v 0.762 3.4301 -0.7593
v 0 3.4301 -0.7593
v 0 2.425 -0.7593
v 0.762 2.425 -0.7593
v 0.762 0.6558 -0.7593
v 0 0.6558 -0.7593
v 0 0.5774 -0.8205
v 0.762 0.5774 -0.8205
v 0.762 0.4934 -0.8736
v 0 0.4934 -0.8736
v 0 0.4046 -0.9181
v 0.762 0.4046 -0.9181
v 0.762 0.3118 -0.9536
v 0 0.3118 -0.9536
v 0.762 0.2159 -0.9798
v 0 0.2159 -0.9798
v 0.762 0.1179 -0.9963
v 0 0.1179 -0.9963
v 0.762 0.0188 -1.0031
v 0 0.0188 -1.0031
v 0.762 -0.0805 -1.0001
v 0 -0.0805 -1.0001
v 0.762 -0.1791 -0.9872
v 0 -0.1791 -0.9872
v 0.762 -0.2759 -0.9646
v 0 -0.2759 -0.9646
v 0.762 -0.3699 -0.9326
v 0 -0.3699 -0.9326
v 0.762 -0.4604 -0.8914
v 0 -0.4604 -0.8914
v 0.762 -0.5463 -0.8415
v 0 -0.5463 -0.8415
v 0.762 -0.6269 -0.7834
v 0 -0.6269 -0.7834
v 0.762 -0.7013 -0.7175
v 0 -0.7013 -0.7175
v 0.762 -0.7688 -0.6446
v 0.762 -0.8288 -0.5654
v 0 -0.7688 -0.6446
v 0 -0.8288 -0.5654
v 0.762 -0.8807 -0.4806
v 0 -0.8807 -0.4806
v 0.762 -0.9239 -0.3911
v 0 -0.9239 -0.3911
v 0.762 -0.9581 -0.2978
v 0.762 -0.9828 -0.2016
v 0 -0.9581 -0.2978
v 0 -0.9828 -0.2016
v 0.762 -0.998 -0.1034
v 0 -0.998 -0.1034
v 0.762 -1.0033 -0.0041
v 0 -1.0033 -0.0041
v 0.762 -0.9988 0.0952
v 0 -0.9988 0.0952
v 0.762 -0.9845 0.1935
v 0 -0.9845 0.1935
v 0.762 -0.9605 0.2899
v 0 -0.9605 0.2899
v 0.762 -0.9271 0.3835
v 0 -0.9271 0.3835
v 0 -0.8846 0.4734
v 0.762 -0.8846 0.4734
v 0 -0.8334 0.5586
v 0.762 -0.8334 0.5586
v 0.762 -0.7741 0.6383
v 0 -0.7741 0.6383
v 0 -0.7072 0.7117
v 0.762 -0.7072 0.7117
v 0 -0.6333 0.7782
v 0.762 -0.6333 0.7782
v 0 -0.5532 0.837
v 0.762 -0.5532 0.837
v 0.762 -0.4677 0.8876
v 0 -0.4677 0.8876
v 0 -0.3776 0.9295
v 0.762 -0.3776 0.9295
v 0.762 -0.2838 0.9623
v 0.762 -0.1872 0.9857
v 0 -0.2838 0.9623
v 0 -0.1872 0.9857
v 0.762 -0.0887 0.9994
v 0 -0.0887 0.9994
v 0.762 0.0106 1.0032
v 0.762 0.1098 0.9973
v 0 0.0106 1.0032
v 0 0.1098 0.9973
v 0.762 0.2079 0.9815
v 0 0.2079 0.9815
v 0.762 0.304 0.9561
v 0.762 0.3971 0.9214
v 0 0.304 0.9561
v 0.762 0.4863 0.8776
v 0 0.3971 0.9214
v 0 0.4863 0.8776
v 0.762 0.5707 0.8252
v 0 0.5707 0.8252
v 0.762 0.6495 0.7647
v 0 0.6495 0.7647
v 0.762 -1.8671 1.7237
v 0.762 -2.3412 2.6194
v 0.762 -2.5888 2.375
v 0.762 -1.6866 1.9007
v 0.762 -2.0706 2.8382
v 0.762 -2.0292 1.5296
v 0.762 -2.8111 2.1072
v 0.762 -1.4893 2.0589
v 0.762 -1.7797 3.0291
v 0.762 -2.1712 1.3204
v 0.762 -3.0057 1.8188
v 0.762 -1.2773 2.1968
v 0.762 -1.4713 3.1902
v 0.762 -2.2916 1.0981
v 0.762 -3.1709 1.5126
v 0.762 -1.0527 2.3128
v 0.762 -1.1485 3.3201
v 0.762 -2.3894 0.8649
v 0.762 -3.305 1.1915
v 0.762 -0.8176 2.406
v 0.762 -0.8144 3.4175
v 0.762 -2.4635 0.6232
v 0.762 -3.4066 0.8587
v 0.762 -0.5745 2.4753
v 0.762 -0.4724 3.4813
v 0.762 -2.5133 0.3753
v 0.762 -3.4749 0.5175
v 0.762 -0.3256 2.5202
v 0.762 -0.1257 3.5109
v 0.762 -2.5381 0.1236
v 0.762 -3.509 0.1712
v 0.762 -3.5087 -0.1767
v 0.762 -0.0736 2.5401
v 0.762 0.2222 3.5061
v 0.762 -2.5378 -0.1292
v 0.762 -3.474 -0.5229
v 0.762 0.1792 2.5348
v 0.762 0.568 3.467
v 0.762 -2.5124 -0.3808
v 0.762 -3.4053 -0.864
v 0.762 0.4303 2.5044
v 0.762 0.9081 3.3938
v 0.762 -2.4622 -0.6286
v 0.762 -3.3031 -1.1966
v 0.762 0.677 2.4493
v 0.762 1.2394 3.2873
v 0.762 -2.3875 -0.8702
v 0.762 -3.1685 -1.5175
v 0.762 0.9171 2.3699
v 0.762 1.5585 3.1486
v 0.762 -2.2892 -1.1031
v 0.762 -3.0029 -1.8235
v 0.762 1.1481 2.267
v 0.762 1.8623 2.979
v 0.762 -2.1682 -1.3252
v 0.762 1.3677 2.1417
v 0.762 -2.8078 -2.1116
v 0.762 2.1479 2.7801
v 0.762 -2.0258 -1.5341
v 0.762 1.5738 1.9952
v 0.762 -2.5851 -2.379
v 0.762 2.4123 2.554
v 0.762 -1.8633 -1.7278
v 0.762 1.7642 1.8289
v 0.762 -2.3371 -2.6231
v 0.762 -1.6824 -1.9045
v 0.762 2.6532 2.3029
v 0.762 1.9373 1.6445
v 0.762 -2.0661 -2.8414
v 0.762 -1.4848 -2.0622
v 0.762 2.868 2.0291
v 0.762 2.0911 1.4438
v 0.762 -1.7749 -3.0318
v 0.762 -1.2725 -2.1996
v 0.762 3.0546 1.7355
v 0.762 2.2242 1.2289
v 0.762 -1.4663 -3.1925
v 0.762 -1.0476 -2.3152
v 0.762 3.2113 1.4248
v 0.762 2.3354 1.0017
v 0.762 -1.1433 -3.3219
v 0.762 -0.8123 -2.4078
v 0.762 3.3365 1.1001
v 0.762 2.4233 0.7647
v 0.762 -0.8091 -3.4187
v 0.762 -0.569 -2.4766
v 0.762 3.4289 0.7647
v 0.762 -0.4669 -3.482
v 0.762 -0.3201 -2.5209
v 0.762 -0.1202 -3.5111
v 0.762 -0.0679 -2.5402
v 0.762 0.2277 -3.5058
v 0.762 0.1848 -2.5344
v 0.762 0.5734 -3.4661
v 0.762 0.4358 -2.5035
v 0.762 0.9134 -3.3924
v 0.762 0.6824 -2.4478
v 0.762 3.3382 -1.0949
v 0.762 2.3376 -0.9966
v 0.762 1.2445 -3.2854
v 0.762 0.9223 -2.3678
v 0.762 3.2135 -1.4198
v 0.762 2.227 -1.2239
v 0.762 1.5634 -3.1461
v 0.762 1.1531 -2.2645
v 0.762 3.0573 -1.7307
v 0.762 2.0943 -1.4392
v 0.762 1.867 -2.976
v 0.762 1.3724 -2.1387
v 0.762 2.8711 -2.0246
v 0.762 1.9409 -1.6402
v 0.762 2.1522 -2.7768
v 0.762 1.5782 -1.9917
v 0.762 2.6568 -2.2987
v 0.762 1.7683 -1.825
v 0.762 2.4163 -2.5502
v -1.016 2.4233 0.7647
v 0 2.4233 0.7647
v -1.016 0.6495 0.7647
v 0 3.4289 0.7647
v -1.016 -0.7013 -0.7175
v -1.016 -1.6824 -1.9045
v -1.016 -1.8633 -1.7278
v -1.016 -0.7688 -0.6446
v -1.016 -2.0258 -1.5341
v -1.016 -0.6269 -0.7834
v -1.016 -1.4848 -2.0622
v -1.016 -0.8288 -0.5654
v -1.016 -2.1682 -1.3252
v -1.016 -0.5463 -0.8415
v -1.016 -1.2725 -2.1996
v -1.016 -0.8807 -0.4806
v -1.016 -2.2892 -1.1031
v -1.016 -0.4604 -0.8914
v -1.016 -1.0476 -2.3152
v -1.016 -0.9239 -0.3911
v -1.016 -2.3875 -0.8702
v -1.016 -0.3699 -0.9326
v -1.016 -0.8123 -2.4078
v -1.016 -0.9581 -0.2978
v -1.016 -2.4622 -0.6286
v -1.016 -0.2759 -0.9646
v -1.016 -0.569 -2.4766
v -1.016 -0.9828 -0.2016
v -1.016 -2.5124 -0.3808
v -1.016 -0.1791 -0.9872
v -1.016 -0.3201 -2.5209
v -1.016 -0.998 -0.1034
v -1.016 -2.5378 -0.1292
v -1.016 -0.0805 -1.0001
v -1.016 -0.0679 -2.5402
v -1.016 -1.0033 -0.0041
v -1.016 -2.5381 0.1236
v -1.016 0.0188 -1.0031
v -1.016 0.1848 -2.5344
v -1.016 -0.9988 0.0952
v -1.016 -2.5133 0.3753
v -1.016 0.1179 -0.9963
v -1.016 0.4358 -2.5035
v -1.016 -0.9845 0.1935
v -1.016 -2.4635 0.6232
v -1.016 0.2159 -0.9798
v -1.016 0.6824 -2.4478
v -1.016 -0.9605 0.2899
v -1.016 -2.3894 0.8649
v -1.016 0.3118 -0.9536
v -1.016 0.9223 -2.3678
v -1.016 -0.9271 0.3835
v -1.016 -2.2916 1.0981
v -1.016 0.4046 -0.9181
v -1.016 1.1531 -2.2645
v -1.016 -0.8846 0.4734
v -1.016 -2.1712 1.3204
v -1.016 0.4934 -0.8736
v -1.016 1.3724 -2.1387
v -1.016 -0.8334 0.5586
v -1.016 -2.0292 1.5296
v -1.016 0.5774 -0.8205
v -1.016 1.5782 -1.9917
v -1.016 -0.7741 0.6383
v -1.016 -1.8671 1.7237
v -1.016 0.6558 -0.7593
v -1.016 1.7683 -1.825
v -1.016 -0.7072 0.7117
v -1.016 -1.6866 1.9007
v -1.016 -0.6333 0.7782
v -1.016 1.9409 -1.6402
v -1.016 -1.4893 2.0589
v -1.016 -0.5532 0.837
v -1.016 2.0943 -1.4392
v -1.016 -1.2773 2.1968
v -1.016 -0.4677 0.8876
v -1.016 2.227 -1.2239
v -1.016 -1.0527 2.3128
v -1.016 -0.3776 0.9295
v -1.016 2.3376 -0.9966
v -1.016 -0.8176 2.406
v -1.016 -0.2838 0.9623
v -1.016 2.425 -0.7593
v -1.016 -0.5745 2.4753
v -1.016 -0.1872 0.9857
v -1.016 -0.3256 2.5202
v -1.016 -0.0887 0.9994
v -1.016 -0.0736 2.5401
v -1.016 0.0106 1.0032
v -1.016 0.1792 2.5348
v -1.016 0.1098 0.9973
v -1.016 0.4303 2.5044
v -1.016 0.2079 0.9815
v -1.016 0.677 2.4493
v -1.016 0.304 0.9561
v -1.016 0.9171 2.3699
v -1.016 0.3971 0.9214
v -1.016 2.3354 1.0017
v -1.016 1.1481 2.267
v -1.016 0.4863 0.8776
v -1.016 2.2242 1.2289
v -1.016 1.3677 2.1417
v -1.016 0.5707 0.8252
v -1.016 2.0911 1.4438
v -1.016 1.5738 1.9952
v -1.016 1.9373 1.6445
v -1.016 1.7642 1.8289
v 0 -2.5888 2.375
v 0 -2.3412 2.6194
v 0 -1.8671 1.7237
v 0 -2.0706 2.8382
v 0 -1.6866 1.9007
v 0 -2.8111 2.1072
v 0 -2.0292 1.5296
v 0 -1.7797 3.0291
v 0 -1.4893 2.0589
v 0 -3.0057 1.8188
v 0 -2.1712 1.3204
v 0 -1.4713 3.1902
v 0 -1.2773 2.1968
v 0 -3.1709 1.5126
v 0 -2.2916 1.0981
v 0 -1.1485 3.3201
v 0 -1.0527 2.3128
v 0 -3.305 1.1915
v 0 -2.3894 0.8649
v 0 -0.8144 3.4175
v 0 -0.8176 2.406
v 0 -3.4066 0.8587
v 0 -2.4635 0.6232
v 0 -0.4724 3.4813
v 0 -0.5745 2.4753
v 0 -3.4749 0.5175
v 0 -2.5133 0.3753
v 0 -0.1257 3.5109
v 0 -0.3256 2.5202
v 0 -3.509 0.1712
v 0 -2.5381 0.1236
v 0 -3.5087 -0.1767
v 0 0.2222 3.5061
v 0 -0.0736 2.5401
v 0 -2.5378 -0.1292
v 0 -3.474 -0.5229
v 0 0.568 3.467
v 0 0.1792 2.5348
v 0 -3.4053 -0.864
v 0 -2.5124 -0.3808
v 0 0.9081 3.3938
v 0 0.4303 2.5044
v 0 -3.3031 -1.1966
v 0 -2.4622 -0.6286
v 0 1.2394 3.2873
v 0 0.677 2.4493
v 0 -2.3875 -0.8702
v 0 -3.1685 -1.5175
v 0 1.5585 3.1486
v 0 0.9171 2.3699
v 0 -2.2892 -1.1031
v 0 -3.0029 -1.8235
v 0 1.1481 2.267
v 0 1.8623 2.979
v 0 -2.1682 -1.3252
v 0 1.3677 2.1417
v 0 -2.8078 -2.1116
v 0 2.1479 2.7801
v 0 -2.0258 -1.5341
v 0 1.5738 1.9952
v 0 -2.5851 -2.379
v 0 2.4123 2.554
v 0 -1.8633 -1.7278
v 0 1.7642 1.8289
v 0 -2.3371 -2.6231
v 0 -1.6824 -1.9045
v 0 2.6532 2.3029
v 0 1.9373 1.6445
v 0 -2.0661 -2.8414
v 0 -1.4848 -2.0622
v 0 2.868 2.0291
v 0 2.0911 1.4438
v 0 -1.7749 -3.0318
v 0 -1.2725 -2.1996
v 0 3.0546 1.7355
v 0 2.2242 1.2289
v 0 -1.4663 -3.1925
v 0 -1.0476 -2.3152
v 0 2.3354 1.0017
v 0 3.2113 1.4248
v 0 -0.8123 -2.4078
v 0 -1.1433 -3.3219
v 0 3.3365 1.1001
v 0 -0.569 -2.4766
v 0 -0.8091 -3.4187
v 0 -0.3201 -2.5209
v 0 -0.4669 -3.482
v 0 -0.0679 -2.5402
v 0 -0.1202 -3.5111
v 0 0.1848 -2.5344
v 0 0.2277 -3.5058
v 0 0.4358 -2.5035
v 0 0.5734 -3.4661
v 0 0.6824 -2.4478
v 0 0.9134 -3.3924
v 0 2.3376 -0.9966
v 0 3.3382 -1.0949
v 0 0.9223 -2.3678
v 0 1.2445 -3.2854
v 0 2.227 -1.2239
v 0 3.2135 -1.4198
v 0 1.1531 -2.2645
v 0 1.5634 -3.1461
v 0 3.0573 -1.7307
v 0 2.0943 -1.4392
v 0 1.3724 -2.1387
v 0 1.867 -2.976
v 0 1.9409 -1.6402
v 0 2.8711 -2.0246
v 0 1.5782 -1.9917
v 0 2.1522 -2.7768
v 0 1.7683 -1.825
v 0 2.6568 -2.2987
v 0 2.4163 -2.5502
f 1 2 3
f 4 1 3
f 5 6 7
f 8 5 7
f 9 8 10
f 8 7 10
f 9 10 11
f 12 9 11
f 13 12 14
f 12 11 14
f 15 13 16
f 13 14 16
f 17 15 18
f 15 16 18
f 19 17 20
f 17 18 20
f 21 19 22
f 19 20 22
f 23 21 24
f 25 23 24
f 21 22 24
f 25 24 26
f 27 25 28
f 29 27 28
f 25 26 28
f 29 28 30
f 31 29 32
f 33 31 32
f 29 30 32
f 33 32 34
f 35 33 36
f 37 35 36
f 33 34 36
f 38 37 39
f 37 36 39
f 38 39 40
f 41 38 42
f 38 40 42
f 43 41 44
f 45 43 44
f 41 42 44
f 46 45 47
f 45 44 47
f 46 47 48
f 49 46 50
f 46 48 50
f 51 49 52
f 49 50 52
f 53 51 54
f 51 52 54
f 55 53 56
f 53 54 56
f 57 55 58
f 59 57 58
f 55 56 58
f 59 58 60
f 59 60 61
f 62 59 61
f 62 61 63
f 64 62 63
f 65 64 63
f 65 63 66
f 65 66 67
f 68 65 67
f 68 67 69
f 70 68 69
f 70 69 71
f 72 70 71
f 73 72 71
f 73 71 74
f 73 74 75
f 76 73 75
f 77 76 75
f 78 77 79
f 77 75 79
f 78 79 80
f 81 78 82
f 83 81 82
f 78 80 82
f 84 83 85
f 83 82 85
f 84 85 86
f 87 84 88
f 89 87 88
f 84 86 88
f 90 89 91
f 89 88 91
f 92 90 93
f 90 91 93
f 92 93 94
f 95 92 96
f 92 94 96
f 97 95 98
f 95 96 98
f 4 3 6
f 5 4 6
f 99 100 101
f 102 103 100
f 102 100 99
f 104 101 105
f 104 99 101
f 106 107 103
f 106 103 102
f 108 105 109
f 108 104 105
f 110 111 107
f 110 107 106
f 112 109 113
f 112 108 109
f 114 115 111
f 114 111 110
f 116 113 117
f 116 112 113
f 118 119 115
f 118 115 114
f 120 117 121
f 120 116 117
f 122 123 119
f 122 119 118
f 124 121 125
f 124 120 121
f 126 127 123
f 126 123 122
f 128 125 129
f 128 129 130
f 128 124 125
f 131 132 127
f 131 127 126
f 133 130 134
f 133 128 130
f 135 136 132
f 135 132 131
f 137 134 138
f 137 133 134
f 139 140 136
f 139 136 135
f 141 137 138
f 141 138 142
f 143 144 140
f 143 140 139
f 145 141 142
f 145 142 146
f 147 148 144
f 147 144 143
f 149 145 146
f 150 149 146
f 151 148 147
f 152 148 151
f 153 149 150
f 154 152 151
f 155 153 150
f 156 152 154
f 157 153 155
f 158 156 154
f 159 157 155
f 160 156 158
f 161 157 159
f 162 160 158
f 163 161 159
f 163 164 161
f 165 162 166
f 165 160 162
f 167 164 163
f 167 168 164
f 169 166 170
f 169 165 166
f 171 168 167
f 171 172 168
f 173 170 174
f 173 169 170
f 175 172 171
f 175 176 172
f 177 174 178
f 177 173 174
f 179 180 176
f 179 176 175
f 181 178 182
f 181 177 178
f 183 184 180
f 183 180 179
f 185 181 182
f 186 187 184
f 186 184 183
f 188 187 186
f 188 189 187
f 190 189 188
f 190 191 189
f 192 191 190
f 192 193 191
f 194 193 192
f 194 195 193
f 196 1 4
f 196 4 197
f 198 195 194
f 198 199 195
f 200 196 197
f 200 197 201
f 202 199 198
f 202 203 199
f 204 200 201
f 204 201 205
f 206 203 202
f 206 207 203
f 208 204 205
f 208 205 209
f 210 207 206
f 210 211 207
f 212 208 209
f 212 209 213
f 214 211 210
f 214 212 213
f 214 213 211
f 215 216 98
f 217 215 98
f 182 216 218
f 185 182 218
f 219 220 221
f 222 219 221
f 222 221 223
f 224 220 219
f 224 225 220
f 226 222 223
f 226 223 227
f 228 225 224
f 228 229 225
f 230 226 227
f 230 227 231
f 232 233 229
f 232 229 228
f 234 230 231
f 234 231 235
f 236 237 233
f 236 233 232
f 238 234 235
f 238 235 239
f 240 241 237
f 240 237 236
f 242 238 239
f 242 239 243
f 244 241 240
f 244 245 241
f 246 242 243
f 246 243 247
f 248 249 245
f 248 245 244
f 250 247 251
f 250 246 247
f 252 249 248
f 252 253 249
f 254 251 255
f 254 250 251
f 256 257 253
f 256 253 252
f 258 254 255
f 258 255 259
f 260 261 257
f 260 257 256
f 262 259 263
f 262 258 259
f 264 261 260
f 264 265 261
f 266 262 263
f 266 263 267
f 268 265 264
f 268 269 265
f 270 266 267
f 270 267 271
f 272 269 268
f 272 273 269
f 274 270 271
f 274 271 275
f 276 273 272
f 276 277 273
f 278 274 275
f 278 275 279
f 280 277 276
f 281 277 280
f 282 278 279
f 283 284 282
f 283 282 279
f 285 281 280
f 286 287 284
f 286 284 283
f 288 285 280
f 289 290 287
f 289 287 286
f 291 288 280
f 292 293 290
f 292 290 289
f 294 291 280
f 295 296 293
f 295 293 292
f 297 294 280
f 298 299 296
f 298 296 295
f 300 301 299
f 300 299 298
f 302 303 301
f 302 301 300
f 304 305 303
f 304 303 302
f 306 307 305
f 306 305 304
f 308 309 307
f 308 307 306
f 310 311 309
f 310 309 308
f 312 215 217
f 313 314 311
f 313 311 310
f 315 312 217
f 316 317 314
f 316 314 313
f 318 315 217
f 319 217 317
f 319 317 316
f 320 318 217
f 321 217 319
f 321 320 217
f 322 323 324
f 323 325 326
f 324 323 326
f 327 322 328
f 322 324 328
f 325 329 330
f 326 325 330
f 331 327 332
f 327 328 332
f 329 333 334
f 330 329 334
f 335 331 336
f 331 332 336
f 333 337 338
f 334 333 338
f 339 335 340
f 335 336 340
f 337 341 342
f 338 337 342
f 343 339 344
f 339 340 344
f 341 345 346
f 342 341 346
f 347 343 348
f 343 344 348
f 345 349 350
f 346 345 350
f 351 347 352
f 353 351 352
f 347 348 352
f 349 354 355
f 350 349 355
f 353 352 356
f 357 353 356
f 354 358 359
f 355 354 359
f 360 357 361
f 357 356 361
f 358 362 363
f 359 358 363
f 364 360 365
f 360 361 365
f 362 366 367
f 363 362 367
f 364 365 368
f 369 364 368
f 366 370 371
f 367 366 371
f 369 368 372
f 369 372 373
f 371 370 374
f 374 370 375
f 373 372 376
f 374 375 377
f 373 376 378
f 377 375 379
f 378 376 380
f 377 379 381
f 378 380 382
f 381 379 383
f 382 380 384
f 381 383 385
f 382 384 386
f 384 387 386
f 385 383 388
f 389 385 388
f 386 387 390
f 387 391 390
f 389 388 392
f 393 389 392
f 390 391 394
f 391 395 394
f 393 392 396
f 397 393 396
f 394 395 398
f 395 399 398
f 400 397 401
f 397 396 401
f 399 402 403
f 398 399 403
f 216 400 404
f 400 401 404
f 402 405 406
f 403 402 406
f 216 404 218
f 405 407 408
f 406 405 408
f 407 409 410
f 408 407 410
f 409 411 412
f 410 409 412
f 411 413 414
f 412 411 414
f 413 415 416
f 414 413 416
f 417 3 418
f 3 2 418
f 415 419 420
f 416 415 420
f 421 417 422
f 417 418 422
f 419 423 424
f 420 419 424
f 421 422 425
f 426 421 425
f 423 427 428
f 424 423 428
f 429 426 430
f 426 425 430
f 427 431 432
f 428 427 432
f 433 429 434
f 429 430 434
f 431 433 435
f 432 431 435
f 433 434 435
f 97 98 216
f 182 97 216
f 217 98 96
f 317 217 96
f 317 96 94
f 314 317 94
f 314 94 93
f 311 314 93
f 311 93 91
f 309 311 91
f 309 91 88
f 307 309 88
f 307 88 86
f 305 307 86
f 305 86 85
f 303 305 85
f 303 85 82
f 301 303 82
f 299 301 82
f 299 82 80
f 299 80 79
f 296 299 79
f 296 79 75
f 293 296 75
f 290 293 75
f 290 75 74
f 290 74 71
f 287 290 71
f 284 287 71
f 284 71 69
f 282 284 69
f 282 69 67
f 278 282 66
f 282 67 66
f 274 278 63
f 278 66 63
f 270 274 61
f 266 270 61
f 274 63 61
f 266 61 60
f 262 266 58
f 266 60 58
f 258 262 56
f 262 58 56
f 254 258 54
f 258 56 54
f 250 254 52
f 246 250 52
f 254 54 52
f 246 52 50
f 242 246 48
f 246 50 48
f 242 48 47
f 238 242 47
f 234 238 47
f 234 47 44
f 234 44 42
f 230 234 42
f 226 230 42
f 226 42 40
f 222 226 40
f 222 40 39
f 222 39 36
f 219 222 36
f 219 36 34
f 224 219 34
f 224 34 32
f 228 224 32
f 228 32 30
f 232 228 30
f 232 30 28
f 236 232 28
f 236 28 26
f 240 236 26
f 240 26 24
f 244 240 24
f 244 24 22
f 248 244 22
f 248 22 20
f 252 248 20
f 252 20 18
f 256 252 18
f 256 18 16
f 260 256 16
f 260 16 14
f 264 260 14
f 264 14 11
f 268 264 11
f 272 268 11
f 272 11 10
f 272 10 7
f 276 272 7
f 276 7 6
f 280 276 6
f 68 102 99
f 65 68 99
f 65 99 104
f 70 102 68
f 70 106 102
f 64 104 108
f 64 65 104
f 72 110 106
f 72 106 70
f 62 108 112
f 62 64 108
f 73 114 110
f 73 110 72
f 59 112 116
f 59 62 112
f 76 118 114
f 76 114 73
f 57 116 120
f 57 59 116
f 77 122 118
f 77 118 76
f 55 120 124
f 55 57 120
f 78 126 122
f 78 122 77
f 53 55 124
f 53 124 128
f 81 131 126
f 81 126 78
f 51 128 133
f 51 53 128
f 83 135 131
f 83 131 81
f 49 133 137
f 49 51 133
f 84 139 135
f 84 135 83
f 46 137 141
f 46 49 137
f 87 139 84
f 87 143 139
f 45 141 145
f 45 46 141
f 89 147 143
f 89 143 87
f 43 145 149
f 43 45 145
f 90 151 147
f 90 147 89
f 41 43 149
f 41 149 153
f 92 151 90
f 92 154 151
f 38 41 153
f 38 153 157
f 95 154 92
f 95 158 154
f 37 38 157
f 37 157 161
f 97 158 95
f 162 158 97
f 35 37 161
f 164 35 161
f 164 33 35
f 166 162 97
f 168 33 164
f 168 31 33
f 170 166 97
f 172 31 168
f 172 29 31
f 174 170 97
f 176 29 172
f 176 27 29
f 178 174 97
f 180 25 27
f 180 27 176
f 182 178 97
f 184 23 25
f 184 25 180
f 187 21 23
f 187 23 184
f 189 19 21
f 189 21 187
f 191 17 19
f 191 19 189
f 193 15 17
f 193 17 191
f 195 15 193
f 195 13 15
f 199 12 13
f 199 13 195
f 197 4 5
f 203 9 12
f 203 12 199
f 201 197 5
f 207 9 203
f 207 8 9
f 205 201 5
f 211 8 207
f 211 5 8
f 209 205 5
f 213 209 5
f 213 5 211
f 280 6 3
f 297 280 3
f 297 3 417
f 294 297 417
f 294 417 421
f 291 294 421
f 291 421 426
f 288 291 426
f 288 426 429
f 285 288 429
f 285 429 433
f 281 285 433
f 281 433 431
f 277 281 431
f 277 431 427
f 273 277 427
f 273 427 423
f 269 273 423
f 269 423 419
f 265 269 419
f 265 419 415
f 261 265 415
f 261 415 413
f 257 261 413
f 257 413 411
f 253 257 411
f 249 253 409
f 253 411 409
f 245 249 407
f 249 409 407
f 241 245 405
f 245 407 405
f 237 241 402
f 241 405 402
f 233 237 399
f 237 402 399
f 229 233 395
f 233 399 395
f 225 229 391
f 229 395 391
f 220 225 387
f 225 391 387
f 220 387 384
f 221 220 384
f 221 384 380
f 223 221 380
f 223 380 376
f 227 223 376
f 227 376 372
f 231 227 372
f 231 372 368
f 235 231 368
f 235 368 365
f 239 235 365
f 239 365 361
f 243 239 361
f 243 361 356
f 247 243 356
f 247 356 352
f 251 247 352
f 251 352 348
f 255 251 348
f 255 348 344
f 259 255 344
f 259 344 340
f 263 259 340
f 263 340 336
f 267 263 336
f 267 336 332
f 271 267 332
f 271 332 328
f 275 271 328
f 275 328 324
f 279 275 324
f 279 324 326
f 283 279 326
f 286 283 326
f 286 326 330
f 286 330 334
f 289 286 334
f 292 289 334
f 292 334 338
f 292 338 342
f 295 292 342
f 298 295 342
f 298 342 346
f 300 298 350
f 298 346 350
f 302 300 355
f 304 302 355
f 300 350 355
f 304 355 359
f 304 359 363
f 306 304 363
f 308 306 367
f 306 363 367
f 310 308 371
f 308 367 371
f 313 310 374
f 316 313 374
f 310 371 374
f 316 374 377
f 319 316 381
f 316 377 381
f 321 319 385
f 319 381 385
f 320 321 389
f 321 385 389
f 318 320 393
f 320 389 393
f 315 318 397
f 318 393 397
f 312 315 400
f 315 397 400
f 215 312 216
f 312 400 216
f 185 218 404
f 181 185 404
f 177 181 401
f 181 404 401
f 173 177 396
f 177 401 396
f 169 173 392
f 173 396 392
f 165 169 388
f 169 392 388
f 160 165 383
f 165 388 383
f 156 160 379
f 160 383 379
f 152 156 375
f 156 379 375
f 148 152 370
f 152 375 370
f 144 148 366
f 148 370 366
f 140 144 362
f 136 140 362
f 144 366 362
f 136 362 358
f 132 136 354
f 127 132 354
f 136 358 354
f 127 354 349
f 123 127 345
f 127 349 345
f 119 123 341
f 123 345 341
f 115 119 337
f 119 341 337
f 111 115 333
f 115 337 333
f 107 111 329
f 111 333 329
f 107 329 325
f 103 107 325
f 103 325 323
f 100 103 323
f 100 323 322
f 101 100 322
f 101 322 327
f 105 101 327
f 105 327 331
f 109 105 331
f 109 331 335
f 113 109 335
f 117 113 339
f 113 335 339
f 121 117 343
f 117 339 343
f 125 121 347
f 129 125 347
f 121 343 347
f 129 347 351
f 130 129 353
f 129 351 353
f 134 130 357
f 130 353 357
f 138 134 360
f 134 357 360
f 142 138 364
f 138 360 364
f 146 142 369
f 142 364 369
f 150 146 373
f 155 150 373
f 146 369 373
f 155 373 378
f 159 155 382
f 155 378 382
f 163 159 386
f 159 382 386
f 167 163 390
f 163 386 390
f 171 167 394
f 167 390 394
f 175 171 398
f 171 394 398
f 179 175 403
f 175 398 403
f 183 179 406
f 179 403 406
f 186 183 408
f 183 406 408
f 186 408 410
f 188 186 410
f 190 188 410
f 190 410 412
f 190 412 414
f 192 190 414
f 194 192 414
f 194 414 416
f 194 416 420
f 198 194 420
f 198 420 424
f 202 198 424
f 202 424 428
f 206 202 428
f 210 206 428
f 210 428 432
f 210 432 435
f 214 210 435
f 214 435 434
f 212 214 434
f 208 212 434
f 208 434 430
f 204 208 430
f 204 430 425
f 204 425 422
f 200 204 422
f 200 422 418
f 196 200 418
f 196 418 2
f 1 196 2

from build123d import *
from build123d.topology import SkipClean

# Parameters (mm, degrees)
BOSS_EXTRUDE1_DEPTH = 0.762
BOSS_EXTRUDE2_DEPTH = 1.778


with BuildPart() as part:
    # Sketch1 → Boss-Extrude1 (new body)
    with BuildSketch(Plane(origin=(0, 0, 0), x_dir=(0, 0, -1), z_dir=(1, 0, 0))):
        with BuildLine():
            Line((0.759321469, 3.430139815), (0.759321469, 0.655775721))
            ThreePointArc((0.759321469, 0.655775721), (0.004117603, -1.003291551), (-0.764678531, 0.649521081))
            Line((-0.764678531, 0.649521081), (-0.764678531, 3.428949546))
            ThreePointArc((-0.764678531, 3.428949546), (0.00274385, -3.51317815), (0.759321469, 3.430139815))
        make_face()
    extrude(amount=BOSS_EXTRUDE1_DEPTH)

    # Sketch3 → Boss-Extrude2 (add)
    with SkipClean():  # the faces are left unmerged after this step: merging them gives an invalid solid
        with BuildSketch(Plane(origin=(0.762, 0, 0), x_dir=(0, 0, -1), z_dir=(1, 0, 0))):
            with BuildLine():
                Line((-0.764678531, 2.423347628), (-0.764678531, 0.649521081))
                ThreePointArc((-0.764678531, 0.649521081), (0.004117603, -1.003291551), (0.759321469, 0.655775721))
                Line((0.759321469, 0.655775721), (0.759321469, 2.425031523))
                ThreePointArc((0.759321469, 2.425031523), (0.00280774, -2.541129493), (-0.764678531, 2.423347628))
            make_face()
        extrude(amount=-BOSS_EXTRUDE2_DEPTH)


solid = part.part
